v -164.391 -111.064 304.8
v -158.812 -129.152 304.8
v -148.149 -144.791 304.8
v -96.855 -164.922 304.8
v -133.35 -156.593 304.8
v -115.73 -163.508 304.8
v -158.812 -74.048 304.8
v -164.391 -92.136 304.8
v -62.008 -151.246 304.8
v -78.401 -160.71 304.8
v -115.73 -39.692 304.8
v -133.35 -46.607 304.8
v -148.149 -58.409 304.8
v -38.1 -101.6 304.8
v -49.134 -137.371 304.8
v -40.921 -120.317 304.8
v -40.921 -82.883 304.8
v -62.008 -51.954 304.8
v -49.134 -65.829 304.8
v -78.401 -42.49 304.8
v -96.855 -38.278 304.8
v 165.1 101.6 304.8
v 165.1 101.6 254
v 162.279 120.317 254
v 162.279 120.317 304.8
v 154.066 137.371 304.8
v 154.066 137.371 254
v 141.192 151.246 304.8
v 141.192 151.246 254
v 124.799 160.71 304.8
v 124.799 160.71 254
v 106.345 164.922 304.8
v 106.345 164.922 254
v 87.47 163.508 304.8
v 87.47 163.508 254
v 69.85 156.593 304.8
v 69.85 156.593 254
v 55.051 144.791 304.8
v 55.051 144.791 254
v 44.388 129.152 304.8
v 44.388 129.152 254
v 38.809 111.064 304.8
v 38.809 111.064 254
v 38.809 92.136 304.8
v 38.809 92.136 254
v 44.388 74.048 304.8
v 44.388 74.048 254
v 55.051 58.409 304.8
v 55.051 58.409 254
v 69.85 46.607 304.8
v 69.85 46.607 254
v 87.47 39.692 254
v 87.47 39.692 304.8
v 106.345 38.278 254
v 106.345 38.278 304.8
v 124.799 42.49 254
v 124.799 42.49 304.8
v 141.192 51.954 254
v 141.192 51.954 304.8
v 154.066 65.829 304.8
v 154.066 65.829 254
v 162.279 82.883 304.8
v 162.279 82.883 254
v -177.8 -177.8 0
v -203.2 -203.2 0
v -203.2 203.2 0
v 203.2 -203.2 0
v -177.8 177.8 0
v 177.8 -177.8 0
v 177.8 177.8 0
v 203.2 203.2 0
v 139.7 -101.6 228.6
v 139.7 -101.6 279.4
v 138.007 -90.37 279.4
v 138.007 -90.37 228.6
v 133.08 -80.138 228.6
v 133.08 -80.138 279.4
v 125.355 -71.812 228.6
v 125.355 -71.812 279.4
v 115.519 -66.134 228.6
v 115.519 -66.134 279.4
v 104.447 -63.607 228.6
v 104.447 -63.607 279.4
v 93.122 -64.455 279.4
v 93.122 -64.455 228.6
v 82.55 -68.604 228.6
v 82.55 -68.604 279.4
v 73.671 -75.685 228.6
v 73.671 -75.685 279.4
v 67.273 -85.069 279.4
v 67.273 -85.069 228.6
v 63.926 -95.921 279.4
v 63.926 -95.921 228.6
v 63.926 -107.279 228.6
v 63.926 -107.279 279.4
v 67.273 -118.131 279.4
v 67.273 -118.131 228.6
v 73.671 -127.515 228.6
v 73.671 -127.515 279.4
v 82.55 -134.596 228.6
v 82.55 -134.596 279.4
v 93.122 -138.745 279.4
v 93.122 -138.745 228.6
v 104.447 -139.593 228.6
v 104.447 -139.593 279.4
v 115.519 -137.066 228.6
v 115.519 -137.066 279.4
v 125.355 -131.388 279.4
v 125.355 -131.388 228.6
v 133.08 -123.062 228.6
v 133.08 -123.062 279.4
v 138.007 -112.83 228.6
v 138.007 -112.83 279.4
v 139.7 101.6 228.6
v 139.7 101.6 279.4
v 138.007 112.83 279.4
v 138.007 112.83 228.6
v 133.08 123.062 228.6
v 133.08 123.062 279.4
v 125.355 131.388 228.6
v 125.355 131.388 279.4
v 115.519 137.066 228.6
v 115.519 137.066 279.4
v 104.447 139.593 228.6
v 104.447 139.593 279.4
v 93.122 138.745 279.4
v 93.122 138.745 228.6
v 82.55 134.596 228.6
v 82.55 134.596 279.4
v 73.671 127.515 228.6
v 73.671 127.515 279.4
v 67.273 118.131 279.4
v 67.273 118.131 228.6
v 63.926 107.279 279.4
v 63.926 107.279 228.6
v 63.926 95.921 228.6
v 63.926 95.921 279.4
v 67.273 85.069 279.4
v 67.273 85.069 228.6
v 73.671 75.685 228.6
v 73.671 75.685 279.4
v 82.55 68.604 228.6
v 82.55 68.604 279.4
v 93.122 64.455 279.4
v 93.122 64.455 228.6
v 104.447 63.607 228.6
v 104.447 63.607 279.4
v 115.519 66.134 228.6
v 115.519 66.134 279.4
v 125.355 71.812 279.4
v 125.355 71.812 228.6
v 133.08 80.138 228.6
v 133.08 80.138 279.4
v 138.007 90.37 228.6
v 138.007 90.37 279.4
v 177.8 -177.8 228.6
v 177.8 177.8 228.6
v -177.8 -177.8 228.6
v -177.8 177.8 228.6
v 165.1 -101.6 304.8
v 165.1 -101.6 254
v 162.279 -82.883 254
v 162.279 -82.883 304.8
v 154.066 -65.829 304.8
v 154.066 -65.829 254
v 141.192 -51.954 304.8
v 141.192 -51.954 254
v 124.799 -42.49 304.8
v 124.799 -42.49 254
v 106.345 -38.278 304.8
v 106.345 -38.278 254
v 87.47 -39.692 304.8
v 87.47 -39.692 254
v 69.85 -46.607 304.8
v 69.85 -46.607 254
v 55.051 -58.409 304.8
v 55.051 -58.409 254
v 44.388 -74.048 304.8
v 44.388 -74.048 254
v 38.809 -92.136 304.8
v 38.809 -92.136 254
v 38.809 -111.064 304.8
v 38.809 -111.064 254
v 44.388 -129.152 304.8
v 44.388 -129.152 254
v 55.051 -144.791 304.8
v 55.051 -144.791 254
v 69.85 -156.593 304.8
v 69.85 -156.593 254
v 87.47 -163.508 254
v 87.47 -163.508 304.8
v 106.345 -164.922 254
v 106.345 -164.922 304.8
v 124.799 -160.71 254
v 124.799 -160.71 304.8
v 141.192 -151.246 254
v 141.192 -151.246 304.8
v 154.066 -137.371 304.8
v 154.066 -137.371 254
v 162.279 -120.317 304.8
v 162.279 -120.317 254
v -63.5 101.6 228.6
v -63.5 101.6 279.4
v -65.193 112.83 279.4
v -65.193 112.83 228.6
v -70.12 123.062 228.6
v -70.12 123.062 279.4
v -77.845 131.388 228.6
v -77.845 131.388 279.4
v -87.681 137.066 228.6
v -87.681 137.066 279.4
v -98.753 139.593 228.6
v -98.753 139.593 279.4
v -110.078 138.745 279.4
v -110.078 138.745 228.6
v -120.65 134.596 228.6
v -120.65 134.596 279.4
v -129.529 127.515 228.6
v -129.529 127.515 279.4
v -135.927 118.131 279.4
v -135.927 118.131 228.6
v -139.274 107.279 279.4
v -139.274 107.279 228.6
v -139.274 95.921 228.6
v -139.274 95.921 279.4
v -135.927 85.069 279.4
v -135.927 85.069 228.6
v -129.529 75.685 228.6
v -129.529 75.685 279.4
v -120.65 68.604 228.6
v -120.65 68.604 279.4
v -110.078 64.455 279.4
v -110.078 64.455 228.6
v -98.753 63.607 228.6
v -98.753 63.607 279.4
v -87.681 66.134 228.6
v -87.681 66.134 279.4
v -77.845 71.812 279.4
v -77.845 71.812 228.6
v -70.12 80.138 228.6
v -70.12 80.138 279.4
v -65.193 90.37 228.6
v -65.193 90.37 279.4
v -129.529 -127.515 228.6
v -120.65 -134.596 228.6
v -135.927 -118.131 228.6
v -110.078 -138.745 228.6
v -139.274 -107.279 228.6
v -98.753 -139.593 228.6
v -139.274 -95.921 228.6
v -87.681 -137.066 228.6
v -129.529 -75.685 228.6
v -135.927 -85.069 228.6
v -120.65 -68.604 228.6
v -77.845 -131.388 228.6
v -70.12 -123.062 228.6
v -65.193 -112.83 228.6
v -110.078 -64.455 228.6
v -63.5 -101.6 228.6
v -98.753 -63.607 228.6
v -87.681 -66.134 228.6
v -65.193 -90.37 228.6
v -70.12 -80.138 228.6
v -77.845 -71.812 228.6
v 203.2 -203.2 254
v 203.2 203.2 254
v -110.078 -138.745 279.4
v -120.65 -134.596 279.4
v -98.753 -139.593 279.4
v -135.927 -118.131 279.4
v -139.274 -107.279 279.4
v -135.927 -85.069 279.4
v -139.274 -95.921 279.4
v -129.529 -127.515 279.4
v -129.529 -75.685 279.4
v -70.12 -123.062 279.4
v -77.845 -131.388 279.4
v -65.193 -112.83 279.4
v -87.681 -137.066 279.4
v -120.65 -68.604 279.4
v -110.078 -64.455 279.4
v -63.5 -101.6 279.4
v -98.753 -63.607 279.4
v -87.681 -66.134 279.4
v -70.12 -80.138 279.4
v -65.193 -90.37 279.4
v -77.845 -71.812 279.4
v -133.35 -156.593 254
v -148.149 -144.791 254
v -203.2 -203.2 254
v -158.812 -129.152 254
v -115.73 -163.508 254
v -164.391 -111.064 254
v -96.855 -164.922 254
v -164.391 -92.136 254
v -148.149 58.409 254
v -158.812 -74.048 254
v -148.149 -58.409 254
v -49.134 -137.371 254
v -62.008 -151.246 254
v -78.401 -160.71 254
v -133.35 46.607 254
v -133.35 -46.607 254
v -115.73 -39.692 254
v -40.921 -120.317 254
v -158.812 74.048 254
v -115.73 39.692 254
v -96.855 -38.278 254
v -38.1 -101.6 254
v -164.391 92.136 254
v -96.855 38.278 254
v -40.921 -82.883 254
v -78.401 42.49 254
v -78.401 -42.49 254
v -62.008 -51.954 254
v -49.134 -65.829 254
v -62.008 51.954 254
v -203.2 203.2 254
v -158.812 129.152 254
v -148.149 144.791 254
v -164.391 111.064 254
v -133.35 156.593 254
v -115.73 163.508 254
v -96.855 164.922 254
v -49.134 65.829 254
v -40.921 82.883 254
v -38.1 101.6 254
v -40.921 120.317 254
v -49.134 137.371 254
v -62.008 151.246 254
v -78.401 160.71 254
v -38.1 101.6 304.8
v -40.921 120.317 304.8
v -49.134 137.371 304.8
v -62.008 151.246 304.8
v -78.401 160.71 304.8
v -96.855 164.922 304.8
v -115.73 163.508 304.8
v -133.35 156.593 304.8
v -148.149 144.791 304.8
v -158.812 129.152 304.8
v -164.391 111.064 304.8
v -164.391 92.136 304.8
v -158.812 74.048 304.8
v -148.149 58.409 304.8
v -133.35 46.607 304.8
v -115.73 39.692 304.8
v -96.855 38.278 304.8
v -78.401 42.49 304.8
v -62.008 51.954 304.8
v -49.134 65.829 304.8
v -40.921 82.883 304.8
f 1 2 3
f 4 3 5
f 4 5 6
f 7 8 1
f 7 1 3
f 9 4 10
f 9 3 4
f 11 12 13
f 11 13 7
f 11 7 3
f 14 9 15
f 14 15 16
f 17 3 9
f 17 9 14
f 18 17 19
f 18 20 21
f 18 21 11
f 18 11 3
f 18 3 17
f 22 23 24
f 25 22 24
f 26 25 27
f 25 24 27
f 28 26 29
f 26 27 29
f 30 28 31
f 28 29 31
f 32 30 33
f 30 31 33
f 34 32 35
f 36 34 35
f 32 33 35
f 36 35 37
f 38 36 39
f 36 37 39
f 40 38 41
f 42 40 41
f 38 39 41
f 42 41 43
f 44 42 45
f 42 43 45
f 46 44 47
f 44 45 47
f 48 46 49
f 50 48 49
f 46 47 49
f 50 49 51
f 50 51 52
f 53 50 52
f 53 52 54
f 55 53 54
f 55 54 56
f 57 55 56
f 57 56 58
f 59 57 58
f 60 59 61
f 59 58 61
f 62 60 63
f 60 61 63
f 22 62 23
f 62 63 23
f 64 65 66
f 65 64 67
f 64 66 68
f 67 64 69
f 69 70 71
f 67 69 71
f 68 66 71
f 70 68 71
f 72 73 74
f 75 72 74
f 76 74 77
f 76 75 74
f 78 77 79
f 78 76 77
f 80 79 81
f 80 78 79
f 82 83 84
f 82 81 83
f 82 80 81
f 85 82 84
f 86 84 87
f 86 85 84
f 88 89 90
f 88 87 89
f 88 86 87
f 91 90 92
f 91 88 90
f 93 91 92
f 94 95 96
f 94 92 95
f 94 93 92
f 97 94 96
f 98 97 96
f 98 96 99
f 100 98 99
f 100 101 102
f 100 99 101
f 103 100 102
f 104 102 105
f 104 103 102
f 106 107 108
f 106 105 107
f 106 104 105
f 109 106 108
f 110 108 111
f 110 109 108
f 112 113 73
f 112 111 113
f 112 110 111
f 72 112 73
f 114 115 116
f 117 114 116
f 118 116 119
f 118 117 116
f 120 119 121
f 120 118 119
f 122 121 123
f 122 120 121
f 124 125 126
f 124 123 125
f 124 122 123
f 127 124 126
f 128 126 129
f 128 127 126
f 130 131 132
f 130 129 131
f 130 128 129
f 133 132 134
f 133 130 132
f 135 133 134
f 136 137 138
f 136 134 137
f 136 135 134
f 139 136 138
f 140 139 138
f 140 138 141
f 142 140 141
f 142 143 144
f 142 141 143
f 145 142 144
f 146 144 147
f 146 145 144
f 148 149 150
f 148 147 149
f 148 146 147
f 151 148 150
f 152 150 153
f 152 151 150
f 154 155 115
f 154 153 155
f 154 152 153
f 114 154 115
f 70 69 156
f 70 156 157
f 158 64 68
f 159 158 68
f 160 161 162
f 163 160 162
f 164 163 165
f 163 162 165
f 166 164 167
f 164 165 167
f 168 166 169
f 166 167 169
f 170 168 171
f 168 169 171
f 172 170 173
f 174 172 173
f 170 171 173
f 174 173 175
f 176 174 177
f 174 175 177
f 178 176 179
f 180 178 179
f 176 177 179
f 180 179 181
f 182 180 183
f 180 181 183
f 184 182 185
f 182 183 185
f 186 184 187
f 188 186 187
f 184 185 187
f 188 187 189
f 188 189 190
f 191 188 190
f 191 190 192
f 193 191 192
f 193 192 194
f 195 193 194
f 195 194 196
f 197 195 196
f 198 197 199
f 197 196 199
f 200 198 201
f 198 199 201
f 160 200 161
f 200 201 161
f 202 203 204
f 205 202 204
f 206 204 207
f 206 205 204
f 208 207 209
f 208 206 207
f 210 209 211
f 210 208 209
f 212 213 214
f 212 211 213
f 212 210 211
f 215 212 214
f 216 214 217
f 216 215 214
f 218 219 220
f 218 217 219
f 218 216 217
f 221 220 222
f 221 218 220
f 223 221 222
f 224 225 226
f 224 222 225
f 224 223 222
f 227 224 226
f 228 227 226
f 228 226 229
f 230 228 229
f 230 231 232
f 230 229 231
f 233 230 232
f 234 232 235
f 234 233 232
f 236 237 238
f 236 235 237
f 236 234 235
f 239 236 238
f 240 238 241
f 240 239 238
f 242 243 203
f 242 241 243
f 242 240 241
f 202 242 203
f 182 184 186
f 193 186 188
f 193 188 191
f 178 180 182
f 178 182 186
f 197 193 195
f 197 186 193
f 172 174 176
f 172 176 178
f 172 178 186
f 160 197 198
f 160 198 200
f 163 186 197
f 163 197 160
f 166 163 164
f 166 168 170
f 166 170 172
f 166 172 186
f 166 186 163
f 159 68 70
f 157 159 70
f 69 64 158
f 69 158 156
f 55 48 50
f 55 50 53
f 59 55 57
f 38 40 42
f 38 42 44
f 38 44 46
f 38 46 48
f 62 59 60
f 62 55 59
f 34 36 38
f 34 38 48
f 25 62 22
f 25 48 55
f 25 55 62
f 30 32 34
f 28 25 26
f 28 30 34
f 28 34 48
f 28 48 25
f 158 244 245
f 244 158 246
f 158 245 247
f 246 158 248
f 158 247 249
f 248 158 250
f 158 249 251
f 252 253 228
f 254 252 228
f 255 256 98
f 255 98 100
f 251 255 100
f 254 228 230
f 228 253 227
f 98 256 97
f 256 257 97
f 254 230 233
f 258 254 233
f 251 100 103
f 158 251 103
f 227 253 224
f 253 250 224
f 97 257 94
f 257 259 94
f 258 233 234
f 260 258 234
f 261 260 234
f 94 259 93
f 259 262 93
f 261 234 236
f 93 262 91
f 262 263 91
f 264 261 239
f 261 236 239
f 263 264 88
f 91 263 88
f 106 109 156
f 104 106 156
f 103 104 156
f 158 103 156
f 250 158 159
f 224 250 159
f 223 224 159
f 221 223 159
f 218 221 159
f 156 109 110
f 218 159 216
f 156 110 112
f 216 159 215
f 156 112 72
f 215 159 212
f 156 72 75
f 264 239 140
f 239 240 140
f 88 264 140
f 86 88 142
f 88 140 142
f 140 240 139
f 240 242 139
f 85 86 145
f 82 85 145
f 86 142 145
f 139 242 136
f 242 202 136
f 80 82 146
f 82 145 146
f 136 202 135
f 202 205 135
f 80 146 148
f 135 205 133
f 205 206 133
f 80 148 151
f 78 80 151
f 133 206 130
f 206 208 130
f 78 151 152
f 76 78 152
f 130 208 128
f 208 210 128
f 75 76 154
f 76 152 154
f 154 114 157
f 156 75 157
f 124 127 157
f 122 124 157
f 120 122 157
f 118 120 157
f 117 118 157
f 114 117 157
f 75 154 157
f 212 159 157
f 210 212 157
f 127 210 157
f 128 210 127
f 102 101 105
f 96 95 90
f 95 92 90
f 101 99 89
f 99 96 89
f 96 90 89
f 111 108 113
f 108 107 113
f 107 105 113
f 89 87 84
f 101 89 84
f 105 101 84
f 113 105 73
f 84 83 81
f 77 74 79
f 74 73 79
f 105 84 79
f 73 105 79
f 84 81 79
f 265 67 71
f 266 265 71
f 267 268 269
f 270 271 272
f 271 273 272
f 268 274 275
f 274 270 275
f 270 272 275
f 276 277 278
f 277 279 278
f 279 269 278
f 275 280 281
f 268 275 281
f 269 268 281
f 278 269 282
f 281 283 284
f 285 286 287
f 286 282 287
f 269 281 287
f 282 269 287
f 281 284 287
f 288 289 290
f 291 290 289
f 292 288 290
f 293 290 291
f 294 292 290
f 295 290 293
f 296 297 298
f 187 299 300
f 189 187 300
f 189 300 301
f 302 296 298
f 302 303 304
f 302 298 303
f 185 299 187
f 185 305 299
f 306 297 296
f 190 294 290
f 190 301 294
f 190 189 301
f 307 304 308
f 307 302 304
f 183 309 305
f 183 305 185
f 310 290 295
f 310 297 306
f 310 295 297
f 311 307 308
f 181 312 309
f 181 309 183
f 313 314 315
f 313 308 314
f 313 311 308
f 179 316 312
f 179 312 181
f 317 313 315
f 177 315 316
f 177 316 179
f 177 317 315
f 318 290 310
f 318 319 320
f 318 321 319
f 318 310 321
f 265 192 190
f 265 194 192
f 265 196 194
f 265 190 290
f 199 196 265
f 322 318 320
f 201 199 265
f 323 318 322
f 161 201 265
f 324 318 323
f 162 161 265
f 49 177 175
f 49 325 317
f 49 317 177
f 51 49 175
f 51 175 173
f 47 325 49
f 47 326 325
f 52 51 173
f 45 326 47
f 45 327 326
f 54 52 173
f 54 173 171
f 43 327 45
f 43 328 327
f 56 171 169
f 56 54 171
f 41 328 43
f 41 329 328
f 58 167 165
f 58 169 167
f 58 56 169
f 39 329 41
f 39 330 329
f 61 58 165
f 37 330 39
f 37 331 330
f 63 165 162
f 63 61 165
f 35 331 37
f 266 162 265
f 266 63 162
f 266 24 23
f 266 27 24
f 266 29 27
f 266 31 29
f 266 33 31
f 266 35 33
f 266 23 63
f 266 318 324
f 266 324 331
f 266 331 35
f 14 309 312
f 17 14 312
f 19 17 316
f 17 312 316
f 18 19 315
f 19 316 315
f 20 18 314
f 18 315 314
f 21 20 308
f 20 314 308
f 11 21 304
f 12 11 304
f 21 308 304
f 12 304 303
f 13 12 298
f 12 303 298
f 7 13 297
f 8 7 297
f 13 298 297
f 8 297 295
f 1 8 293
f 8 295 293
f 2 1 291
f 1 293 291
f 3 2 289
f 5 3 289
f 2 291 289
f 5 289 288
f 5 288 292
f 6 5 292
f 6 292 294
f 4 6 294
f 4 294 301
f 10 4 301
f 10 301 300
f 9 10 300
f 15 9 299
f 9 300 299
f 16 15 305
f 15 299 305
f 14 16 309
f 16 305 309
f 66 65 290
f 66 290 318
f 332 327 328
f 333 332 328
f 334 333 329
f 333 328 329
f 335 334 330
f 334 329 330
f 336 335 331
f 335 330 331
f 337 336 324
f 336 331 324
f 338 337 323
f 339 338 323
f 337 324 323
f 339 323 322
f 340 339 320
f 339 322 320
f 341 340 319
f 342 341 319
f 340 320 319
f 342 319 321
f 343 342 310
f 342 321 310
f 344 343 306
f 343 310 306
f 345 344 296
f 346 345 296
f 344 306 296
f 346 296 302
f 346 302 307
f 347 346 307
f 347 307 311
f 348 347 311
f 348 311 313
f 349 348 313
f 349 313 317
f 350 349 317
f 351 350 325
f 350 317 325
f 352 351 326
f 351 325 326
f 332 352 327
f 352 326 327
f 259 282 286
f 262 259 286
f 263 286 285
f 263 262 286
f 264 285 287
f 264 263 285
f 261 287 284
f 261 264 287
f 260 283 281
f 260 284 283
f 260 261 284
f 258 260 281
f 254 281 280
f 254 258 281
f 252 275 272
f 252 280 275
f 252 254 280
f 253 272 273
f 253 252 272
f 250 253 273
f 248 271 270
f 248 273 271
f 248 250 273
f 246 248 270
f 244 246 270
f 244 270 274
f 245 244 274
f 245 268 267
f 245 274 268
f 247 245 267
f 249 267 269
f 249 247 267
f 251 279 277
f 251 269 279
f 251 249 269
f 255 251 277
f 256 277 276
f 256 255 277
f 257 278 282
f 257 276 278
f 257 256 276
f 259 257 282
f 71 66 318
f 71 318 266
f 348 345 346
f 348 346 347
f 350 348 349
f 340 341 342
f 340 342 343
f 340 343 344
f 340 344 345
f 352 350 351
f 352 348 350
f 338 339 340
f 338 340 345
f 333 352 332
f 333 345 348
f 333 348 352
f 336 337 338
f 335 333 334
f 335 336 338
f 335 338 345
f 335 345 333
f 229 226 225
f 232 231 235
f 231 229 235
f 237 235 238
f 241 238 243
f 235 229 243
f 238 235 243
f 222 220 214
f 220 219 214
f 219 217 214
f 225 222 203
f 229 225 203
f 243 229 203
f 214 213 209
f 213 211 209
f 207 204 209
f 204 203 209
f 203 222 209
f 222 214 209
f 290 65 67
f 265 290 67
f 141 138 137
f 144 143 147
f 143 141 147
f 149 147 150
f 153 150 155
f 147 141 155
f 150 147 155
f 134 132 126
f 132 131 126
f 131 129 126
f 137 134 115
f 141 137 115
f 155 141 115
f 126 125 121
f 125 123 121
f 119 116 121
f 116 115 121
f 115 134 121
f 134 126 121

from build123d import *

# Parameters (mm, degrees)
F0_W     = 406.4
F0_H     = 406.4
F1_DEPTH = 254
F2_R     = 63.5
F3_DEPTH = 50.8
F4_T     = -25.4


with BuildPart() as f1:
    # F0 (on Top) → F1 (new body)
    with BuildSketch(Plane.XY):
        Rectangle(F0_W, F0_H)
    extrude(amount=F1_DEPTH)

    # F2 (on face) → F3 (join)
    with BuildSketch(Plane.XY.offset(254)):
        with Locations((101.6, 101.6)):
            Circle(F2_R)
        with Locations((101.6, -101.6)):
            Circle(F2_R)
        with Locations((-101.6, -101.6)):
            Circle(F2_R)
        with Locations((-101.6, 101.6)):
            Circle(F2_R)
    extrude(amount=F3_DEPTH)

    # F4
    f4_openings = [f1.faces().sort_by_distance(p)[0] for p in [
        (0, 0, 0),
    ]]
    offset(amount=F4_T, openings=f4_openings, kind=Kind.INTERSECTION)


solid = f1.part
